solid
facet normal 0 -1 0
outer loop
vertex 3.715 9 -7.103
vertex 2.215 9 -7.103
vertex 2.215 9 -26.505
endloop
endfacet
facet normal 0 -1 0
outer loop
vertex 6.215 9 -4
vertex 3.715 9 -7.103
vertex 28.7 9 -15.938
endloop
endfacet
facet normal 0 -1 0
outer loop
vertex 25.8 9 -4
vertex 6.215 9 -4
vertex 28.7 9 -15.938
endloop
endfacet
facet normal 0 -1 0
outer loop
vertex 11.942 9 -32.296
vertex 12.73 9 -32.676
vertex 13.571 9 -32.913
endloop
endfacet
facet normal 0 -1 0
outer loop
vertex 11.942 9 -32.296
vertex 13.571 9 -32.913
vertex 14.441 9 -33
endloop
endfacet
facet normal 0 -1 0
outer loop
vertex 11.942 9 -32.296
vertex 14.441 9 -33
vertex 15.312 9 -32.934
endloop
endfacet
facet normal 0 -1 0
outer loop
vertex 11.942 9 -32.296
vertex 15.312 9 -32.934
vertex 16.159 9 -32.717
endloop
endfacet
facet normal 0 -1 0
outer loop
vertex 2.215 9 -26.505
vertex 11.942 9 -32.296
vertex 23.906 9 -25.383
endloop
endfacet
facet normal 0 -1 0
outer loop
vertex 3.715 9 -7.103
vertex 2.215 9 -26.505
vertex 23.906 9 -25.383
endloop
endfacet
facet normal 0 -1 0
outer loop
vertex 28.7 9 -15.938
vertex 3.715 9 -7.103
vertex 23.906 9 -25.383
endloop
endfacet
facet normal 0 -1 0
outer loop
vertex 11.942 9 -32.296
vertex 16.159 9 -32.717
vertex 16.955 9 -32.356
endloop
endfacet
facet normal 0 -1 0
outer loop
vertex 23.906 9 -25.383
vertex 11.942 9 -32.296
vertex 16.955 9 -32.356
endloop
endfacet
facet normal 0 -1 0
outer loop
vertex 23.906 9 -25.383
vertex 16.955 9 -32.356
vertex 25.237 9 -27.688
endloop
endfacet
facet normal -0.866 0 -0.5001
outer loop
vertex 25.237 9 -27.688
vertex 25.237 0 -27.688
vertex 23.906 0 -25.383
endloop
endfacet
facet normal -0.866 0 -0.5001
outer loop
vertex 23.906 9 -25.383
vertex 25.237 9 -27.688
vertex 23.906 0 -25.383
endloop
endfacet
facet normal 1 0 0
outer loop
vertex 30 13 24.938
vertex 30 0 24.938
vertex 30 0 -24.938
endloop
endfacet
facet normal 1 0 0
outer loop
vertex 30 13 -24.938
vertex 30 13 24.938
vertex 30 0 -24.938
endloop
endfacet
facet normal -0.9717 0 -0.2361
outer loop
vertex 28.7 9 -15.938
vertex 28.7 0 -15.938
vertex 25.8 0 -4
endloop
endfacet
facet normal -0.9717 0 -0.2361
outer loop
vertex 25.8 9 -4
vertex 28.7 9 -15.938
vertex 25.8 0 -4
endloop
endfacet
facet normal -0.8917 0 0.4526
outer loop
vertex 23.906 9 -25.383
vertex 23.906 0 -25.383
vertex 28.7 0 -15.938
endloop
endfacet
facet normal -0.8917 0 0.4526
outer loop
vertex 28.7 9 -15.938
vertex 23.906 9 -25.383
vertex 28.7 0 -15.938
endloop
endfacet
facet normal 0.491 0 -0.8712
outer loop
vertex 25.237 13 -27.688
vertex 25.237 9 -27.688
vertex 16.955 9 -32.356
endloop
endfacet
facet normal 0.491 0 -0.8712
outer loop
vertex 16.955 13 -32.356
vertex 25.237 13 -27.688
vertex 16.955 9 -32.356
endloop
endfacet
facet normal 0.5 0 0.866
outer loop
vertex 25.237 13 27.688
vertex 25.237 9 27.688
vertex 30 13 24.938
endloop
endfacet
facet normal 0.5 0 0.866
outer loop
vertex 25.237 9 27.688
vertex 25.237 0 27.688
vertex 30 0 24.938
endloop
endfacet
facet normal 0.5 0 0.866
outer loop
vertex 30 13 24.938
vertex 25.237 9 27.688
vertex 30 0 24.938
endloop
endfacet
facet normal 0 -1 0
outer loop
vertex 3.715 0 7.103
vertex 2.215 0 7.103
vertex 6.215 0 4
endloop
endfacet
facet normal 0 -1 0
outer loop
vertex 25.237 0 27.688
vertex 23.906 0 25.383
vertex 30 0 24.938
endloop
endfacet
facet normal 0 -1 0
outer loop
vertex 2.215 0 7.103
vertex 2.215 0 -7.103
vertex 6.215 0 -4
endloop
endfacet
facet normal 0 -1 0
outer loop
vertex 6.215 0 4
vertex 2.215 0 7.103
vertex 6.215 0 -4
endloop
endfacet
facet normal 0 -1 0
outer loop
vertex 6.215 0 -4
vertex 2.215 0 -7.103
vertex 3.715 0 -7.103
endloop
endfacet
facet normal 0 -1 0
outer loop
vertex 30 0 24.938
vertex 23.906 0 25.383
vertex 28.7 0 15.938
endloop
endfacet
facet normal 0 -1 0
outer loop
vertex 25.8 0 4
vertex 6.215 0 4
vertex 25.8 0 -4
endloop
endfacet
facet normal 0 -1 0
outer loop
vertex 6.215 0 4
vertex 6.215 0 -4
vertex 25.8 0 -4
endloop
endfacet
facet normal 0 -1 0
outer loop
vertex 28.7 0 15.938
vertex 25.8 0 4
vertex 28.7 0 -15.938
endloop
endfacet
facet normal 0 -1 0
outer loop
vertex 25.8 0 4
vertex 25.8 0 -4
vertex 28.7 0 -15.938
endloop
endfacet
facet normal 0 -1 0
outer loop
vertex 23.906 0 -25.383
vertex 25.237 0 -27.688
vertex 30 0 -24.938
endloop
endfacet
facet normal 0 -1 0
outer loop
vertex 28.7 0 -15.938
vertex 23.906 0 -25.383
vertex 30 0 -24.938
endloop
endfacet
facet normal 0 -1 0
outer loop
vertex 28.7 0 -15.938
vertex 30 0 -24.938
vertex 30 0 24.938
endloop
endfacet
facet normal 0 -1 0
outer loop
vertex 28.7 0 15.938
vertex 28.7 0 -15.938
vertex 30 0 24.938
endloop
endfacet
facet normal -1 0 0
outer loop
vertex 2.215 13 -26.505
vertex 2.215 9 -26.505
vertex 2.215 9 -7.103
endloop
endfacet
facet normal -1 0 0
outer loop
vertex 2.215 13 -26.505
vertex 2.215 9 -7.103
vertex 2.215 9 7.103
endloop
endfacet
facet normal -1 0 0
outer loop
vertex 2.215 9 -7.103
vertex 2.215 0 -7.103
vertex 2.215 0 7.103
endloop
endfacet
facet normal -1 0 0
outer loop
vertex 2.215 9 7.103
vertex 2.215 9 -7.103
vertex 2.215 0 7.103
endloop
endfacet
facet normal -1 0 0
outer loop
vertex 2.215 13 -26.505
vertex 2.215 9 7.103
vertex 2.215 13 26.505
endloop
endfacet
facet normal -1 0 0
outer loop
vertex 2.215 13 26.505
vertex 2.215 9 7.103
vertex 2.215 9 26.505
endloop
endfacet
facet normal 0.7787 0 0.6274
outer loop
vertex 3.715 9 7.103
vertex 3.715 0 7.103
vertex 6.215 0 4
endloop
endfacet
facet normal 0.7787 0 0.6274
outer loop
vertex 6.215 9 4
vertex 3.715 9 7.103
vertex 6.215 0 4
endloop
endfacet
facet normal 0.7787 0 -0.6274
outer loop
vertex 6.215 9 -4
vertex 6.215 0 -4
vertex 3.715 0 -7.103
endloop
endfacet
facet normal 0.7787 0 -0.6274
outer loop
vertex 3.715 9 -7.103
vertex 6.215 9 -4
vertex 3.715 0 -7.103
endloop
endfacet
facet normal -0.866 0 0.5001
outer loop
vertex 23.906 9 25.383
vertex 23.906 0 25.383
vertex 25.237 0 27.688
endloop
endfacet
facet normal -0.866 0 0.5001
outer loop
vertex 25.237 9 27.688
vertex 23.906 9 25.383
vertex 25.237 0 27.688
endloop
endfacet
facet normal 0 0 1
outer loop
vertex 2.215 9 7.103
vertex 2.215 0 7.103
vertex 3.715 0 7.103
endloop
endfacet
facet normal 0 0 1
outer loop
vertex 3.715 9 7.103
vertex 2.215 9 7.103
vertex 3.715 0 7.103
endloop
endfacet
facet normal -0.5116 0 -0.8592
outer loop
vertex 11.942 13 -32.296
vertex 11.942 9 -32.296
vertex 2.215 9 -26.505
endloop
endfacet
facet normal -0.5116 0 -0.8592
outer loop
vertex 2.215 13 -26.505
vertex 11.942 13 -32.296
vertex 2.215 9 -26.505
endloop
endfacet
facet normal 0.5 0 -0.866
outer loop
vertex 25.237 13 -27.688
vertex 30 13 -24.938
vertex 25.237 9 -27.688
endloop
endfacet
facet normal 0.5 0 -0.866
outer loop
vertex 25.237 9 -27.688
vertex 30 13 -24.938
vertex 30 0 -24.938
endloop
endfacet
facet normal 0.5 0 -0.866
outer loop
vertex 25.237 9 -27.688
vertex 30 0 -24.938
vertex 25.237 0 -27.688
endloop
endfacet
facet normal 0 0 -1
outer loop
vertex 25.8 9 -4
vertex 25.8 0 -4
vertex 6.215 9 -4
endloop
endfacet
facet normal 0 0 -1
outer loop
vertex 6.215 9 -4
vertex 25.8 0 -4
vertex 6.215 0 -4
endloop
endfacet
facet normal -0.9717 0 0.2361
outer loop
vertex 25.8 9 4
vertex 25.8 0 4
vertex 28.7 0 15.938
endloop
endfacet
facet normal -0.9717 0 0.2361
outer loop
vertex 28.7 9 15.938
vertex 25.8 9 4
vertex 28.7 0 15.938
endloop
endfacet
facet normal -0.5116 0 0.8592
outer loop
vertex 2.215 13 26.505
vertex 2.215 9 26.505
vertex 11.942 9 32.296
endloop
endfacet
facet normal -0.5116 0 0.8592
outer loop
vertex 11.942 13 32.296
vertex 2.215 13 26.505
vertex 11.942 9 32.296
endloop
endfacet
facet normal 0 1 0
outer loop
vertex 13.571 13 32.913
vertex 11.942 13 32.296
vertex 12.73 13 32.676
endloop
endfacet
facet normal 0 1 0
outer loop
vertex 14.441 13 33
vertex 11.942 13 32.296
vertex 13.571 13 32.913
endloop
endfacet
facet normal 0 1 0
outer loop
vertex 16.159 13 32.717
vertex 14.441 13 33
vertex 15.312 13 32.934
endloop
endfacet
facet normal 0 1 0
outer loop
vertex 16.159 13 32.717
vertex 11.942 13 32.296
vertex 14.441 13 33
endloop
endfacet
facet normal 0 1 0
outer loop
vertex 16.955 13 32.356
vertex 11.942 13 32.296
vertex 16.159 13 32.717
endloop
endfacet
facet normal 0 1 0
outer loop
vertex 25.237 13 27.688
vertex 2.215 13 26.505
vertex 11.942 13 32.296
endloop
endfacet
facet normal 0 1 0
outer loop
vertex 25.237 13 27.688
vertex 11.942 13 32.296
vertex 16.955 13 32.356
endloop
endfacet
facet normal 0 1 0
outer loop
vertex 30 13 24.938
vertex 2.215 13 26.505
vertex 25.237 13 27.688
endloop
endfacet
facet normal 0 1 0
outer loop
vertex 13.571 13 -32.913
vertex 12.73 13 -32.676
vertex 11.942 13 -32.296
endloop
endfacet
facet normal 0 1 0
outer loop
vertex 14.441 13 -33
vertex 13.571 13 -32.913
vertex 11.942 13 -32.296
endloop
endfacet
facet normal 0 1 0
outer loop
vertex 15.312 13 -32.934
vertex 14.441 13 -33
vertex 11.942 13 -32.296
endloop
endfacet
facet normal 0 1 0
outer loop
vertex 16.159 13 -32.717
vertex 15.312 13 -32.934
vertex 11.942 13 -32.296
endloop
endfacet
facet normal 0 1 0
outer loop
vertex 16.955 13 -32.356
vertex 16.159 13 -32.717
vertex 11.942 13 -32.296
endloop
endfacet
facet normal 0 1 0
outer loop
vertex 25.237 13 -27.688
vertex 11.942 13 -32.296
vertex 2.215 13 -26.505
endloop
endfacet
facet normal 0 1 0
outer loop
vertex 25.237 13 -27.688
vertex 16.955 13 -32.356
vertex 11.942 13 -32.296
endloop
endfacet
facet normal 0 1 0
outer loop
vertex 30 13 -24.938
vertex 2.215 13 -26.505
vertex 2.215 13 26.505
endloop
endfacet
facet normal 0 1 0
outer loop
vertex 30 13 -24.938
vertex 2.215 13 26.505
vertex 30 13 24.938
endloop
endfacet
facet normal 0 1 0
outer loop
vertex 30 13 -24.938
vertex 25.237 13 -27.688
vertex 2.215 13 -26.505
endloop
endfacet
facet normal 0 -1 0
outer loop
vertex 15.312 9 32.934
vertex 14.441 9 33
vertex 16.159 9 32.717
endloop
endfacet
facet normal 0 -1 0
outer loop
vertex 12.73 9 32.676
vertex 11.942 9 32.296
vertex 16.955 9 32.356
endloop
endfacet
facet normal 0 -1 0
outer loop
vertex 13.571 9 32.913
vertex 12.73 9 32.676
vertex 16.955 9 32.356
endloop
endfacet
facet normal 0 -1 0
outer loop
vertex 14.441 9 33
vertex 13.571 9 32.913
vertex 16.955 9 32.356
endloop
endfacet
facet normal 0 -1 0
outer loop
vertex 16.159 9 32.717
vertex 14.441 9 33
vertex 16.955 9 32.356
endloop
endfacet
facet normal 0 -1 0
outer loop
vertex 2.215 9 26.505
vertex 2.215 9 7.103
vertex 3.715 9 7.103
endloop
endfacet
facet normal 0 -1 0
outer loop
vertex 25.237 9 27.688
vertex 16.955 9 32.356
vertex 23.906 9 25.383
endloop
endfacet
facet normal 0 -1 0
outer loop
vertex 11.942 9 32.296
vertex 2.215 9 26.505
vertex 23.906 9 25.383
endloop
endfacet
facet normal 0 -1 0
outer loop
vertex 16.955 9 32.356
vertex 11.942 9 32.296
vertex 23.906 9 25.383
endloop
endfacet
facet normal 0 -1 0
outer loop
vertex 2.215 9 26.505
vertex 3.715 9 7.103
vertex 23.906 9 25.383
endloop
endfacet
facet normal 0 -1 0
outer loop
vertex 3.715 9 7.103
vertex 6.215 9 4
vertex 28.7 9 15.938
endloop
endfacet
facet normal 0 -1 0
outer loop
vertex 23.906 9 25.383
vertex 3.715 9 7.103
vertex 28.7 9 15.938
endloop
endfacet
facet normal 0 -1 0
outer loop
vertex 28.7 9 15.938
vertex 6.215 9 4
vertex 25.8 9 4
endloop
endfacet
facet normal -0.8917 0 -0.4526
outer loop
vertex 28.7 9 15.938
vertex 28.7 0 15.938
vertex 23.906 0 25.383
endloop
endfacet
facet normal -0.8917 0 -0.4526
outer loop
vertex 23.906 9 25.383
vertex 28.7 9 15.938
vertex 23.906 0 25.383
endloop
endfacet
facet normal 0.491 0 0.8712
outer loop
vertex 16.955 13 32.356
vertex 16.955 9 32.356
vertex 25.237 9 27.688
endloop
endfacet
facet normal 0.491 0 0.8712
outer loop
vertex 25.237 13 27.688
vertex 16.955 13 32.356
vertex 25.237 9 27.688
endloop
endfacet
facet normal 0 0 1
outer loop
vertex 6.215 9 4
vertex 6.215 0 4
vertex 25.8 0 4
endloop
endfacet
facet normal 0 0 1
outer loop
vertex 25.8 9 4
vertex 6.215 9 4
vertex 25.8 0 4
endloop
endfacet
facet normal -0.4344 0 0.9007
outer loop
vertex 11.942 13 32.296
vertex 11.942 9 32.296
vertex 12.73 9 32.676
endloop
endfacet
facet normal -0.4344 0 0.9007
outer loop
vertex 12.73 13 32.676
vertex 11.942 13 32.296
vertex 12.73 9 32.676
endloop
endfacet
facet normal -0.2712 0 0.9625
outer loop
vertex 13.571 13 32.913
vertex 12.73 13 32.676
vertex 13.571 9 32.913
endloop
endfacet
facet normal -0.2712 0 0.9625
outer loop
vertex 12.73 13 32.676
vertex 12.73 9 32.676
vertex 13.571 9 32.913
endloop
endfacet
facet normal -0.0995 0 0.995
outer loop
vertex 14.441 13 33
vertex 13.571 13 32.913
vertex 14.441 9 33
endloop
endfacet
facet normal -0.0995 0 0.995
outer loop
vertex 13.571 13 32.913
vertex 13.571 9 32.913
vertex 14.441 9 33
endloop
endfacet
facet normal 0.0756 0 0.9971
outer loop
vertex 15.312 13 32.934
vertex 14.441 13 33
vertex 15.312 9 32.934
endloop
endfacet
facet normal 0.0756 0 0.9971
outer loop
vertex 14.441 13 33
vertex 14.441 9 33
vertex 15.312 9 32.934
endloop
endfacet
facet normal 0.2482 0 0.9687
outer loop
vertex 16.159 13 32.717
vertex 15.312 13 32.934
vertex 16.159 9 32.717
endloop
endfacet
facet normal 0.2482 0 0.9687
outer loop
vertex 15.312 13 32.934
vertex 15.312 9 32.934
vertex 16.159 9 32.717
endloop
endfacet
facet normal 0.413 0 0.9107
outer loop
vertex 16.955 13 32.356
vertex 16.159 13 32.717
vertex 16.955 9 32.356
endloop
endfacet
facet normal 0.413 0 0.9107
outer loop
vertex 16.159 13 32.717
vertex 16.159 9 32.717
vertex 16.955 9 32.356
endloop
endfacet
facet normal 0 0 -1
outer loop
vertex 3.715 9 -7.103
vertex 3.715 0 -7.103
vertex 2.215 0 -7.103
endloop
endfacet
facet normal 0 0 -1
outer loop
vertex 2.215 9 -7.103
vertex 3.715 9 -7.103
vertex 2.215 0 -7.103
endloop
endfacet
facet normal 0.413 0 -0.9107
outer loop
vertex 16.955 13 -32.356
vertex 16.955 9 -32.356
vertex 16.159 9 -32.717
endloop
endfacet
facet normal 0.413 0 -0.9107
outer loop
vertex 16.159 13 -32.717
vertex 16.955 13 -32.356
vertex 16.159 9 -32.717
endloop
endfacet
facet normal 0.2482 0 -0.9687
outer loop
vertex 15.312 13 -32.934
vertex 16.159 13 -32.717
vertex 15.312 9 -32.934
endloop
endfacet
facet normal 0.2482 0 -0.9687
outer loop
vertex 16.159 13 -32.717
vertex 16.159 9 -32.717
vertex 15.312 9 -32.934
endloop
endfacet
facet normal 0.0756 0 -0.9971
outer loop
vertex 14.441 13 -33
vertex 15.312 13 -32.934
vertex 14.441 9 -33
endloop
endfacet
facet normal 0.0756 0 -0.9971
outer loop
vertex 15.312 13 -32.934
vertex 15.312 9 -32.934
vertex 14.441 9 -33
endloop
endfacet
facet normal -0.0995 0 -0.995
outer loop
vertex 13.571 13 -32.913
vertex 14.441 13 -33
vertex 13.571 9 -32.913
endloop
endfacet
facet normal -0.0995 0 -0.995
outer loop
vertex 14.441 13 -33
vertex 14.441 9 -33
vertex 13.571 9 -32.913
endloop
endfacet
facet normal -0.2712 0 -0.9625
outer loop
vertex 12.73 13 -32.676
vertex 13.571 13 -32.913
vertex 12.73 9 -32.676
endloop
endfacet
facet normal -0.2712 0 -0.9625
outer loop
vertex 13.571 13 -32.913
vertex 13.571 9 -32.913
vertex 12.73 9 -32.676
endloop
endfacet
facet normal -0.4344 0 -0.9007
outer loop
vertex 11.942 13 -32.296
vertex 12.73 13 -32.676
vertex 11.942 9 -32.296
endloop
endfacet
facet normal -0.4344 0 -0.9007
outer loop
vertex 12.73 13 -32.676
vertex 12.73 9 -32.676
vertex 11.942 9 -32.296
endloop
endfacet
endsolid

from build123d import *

# Parameters (mm, degrees)
SKETCH_1_W          = 60
SKETCH_1_H          = 62
EXTRUDE_1_DEPTH     = 9
CUT_EXTRUDE_1_DEPTH = 20
SKETCH_3_R          = 5
EXTRUDE_2_DEPTH     = 4


with BuildPart() as part:
    # 草图1 → 凸台-拉伸1 (new body)
    with BuildSketch(Plane(origin=(0, 0, 0), x_dir=(1, 0, 0), z_dir=(0, 1, 0))):
        Rectangle(SKETCH_1_W, SKETCH_1_H)
    extrude(amount=EXTRUDE_1_DEPTH)

    # 草图2 → 切除-拉伸1 (cut)
    with BuildSketch(Plane.XZ):
        Polygon((6.215250205, 4), (25.8, 4), (28.7, 15.937822174), (23.906181585, 25.383019067), (25.236860279, 27.687822174), (30, 24.937822174), (30, 31), (-30, 31), (-30, -31), (30, -31), (30, -24.937822174), (25.236860279, -27.687822174), (23.906181585, -25.383019067), (28.7, -15.937822174), (25.8, -4), (6.215250205, -4), (3.715250205, -7.102951113), (2.215250205, -7.102951113), (2.215250205, 0), (2.215250205, 7.102951113), (3.715250205, 7.102951113), align=None)
    extrude(amount=-CUT_EXTRUDE_1_DEPTH, mode=Mode.SUBTRACT)

    # 草图3 → 凸台-拉伸2 (add)
    with BuildSketch(Plane(origin=(0, 9, 0), x_dir=(1, 0, 0), z_dir=(0, 1, 0))):
        Polygon((2.215250205, 0), (30, 0), (30, 24.937822174), (25.236860279, 27.687822174), (23.906181585, 25.383019067), (28.7, 15.937822174), (25.8, 4), (6.215250205, 4), (3.715250205, 7.102951113), (2.215250205, 7.102951113), align=None)
        with BuildLine():
            Line((23.906181585, 25.383019067), (25.236860279, 27.687822174))
            Line((25.236860279, 27.687822174), (16.955072532, 32.35575698))
            ThreePointArc((16.955072532, 32.35575698), (18.817138095, 30.522363707), (19.5, 28))
            ThreePointArc((19.5, 28), (12.029027225, 23.65324333), (11.942282582, 32.296286956))
            Line((11.942282582, 32.296286956), (2.215250205, 26.50547261))
            Line((2.215250205, 26.50547261), (2.215250205, 7.102951113))
            Line((2.215250205, 7.102951113), (3.715250205, 7.102951113))
            Line((3.715250205, 7.102951113), (6.215250205, 4))
            Line((6.215250205, 4), (25.8, 4))
            Line((25.8, 4), (28.7, 15.937822174))
            Line((28.7, 15.937822174), (23.906181585, 25.383019067))
        make_face()
        with Locations((14.5, 28)):
            Circle(SKETCH_3_R)
        Polygon((25.236860279, -27.687822174), (30, -24.937822174), (30, 0), (2.215250205, 0), (2.215250205, -7.102951113), (3.715250205, -7.102951113), (6.215250205, -4), (25.8, -4), (28.7, -15.937822174), (23.906181585, -25.383019067), align=None)
        with BuildLine():
            Line((16.955072532, -32.35575698), (25.236860279, -27.687822174))
            Line((25.236860279, -27.687822174), (23.906181585, -25.383019067))
            Line((23.906181585, -25.383019067), (28.7, -15.937822174))
            Line((28.7, -15.937822174), (25.8, -4))
            Line((25.8, -4), (6.215250205, -4))
            Line((6.215250205, -4), (3.715250205, -7.102951113))
            Line((3.715250205, -7.102951113), (2.215250205, -7.102951113))
            Line((2.215250205, -7.102951113), (2.215250205, -26.50547261))
            Line((2.215250205, -26.50547261), (11.942282582, -32.296286956))
            ThreePointArc((11.942282582, -32.296286956), (12.029027225, -23.65324333), (19.5, -28))
            ThreePointArc((19.5, -28), (18.817138095, -30.522363707), (16.955072532, -32.35575698))
        make_face()
        with Locations((14.5, -28)):
            Circle(SKETCH_3_R)
    extrude(amount=EXTRUDE_2_DEPTH)


solid = part.part
